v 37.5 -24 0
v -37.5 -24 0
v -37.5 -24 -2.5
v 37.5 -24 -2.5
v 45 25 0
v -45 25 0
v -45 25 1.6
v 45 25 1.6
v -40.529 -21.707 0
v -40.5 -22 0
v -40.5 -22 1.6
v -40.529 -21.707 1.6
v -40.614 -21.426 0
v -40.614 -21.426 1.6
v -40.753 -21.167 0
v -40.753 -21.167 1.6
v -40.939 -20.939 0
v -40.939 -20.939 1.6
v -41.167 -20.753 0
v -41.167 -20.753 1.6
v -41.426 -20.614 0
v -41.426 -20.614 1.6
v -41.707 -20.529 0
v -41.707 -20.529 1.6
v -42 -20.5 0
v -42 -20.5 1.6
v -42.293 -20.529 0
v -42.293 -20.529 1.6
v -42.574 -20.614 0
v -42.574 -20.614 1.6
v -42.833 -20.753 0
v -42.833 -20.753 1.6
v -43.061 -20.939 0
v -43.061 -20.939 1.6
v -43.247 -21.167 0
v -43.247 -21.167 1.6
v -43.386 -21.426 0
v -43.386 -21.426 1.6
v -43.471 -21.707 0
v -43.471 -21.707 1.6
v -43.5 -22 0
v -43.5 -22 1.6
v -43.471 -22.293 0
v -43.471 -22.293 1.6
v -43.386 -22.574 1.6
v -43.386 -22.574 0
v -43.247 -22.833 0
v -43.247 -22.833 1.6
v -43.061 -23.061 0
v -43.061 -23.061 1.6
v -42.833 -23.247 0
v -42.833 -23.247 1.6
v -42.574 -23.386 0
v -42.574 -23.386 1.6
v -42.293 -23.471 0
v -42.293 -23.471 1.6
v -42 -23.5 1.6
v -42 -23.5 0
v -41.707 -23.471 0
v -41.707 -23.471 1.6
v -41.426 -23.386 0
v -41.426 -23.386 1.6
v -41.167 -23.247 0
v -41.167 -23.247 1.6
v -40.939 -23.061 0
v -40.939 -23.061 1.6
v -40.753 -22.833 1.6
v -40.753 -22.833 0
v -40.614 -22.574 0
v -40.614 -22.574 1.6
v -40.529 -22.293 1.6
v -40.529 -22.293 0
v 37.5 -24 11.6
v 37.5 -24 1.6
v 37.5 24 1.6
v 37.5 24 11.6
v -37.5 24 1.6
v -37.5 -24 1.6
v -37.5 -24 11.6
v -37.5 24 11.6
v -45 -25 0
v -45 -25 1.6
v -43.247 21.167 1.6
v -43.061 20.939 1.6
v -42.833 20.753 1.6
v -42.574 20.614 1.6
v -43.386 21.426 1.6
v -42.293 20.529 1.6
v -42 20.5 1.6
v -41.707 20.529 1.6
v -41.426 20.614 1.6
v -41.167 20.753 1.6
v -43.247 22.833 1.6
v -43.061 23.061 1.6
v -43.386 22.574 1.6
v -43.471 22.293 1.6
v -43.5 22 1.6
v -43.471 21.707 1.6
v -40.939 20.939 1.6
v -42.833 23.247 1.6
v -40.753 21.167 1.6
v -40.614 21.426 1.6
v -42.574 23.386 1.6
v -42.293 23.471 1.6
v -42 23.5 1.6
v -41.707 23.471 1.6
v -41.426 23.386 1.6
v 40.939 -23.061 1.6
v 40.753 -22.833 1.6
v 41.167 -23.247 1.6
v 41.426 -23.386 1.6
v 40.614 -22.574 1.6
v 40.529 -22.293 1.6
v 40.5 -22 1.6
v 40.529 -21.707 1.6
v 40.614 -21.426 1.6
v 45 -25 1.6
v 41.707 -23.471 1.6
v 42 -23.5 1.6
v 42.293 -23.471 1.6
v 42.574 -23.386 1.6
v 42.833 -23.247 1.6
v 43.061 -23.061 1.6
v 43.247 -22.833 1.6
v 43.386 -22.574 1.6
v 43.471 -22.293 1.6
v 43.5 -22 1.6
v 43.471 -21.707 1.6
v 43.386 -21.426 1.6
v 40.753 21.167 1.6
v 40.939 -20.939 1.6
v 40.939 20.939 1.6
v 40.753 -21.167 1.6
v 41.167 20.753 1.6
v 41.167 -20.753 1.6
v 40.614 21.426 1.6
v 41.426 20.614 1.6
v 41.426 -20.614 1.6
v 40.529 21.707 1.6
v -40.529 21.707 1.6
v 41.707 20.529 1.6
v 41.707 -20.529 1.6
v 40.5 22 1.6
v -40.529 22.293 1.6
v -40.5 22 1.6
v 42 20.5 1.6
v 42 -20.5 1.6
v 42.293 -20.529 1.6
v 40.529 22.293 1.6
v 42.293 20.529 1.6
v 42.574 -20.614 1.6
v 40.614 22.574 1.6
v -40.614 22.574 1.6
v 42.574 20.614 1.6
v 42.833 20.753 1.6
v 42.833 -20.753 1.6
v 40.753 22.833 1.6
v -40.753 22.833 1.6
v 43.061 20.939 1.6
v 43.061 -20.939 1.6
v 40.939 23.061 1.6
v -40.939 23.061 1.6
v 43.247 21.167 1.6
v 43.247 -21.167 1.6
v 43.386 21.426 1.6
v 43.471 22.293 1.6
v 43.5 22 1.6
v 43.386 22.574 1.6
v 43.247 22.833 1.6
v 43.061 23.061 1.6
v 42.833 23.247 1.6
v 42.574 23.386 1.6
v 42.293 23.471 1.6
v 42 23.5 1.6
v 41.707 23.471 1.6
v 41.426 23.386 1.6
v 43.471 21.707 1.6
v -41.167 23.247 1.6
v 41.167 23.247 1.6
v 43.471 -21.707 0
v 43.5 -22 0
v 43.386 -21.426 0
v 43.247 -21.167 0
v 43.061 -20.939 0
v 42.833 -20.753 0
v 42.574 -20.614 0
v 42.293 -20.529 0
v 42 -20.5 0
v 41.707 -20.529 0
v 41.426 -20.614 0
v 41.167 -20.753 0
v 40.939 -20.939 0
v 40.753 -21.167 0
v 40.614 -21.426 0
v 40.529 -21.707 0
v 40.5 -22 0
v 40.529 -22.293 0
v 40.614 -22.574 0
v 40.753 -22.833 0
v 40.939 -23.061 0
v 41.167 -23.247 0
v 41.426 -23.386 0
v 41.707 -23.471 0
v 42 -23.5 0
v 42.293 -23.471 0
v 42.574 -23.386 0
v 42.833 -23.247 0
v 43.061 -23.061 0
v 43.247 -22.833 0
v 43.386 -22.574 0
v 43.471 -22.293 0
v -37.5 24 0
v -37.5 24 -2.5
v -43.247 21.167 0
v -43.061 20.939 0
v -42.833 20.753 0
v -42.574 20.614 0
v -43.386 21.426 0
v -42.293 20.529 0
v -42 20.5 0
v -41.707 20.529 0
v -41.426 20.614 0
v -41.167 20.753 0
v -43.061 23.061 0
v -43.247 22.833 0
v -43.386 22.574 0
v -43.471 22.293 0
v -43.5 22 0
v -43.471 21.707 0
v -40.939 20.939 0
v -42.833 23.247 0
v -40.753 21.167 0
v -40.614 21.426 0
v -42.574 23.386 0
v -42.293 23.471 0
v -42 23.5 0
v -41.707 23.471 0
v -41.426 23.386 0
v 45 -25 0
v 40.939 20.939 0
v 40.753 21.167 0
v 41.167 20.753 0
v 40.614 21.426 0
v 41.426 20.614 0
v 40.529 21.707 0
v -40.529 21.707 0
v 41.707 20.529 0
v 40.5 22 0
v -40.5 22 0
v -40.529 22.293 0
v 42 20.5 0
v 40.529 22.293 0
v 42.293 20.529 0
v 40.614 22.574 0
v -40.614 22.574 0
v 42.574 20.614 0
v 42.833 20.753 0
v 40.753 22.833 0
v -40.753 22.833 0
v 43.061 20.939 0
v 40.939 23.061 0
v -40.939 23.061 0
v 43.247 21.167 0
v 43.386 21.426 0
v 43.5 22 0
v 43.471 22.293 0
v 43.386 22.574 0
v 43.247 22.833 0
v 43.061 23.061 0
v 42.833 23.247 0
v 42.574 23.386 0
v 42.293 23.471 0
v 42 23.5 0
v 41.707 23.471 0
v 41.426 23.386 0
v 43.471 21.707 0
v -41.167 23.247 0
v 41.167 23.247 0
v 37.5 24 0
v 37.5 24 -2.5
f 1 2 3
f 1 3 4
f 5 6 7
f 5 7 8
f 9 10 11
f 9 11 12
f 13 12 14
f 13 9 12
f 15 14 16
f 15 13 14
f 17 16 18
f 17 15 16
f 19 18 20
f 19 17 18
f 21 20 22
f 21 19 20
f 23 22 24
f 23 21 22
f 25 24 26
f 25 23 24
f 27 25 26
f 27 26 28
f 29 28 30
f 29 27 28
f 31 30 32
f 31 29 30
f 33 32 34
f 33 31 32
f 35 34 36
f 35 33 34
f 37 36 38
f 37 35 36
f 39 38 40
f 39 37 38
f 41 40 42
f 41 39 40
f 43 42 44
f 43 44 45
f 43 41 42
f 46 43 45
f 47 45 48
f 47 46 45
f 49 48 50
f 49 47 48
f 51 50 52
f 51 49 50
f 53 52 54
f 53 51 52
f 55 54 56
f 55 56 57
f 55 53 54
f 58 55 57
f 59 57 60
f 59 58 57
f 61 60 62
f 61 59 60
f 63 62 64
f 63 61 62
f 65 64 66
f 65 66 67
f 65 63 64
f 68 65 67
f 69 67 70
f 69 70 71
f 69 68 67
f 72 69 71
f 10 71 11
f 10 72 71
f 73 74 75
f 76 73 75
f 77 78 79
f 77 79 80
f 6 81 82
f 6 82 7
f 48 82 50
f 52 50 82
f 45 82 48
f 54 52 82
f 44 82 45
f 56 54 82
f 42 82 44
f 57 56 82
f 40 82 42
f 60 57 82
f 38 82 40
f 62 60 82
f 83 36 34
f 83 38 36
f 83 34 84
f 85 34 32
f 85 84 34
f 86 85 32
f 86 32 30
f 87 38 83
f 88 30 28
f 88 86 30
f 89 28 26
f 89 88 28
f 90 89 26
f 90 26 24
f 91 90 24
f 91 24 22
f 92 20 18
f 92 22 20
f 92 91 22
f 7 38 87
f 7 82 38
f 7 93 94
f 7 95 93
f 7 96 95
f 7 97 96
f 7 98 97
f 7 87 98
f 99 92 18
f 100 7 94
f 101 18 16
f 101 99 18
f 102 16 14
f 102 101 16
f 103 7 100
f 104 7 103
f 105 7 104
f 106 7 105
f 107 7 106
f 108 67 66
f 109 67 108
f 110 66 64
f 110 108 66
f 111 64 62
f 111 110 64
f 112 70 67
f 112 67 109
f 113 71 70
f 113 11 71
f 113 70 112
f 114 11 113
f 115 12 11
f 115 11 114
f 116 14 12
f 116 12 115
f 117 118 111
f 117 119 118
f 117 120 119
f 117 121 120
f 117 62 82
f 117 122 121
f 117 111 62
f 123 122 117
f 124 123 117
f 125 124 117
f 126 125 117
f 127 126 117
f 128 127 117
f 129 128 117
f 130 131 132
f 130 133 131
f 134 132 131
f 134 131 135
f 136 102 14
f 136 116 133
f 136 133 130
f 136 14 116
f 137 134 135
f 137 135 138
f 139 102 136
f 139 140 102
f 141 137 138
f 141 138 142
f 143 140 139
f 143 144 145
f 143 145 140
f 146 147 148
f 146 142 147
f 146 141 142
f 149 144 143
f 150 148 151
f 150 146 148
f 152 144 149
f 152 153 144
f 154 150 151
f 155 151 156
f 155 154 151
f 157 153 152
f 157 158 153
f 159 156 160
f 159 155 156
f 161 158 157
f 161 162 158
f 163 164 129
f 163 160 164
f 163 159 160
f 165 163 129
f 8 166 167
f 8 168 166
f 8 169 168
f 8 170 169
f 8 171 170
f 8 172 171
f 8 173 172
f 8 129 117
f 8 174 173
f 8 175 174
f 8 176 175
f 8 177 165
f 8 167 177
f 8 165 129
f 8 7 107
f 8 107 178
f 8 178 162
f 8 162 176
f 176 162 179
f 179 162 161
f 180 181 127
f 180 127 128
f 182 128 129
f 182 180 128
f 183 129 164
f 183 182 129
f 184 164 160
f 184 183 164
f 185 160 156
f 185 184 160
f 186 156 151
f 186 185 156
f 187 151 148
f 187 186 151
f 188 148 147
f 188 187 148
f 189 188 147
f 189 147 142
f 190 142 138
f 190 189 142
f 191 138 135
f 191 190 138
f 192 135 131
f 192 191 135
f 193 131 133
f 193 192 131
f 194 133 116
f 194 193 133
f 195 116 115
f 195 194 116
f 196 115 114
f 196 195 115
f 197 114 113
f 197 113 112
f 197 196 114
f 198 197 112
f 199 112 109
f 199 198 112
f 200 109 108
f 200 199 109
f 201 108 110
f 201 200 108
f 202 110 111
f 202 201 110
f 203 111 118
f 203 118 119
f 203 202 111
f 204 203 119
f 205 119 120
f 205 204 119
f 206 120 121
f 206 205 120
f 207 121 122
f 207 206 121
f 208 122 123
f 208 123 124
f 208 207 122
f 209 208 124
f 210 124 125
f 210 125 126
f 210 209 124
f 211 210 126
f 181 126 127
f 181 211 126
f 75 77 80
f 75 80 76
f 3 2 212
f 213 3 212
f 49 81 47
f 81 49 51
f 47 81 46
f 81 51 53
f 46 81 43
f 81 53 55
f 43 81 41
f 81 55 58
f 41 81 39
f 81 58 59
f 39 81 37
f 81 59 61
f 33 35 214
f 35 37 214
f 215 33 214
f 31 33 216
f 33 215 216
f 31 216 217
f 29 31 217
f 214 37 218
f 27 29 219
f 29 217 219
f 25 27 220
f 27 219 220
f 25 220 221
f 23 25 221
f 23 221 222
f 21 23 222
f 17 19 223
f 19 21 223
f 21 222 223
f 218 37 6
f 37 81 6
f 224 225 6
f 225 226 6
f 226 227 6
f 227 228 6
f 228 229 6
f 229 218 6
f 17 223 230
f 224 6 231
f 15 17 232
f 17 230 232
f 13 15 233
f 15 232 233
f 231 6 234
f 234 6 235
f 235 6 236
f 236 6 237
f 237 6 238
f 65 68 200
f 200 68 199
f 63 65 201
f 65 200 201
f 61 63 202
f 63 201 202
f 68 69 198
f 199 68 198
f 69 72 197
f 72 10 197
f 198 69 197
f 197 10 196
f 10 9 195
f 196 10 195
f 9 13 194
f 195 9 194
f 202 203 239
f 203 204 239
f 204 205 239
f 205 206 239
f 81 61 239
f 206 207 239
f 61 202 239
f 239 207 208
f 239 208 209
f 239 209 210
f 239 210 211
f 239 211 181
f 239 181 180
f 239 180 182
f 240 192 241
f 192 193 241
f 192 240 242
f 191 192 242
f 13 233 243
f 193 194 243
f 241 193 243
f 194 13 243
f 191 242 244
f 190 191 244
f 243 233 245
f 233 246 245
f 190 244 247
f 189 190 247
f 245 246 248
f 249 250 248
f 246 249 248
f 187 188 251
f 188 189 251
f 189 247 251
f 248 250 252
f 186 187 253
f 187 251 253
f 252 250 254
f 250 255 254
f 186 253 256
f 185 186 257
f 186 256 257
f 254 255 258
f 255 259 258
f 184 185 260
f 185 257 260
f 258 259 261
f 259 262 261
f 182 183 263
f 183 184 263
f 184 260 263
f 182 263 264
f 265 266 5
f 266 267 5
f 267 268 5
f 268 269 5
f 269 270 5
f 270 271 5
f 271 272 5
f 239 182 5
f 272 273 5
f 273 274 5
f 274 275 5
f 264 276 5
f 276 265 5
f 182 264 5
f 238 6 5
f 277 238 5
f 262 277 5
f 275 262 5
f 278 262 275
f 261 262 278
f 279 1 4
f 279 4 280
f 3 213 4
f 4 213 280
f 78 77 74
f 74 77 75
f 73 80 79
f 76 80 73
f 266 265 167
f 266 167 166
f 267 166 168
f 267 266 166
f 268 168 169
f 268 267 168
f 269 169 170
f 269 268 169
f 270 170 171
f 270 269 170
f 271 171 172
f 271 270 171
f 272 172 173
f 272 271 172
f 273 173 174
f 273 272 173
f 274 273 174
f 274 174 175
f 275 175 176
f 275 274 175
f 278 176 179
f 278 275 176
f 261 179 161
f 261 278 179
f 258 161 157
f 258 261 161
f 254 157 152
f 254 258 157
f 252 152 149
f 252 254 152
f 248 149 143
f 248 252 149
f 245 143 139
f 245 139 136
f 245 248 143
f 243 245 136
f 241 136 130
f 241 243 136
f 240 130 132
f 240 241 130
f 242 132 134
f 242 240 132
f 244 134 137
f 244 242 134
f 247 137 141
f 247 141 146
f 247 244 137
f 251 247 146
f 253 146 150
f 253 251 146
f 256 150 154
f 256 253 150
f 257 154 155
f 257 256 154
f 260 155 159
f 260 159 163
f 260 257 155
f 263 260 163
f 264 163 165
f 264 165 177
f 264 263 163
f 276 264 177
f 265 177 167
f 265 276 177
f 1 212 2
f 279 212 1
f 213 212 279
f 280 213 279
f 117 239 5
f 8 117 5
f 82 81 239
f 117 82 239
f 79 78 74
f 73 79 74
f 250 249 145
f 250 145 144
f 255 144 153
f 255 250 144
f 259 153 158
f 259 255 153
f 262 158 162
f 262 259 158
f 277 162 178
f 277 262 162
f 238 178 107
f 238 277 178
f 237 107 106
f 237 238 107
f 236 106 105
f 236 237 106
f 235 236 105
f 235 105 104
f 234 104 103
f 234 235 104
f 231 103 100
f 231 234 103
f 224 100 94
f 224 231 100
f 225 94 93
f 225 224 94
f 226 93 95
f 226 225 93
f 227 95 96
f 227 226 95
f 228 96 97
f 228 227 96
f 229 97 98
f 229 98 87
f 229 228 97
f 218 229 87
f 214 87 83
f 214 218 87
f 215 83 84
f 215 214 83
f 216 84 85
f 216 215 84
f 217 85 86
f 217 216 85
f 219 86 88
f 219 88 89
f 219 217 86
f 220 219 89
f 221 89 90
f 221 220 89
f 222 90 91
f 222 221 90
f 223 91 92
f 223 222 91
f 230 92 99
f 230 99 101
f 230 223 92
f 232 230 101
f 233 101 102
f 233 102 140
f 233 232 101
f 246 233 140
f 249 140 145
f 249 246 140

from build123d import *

# Parameters (mm, degrees)
F0_W     = 90
F0_H     = 50
F0_R     = 1.5
F0_W_2   = 75
F0_H_2   = 48
F1_DEPTH = 1.6
F3_W     = 75
F3_H     = 48
F4_DEPTH = 10
F5_DEPTH = 2.5


with BuildPart() as f1:
    # F0 (on Top) → F1 (new body)
    with BuildSketch(Plane.XY):
        Rectangle(F0_W, F0_H)
        with Locations((-42, -22)):
            Circle(F0_R, mode=Mode.SUBTRACT)
        with Locations((42, -22)):
            Circle(F0_R, mode=Mode.SUBTRACT)
        with Locations((-42, 22)):
            Circle(F0_R, mode=Mode.SUBTRACT)
        Rectangle(F0_W_2, F0_H_2, mode=Mode.SUBTRACT)
        with Locations((42, 22)):
            Circle(F0_R, mode=Mode.SUBTRACT)
        Rectangle(F0_W_2, F0_H_2)
    extrude(amount=F1_DEPTH)


with BuildPart() as f4:
    # F3 (on offset) → F4 (new body)
    with BuildSketch(Plane.XY.offset(1.6)):
        Rectangle(F3_W, F3_H)
    extrude(amount=F4_DEPTH)


with BuildPart() as f5:
    # F0 (on Top) → F5 (new body)
    with BuildSketch(Plane.XY):
        Rectangle(F0_W_2, F0_H_2)
    extrude(amount=-F5_DEPTH)


solid = Compound([f1.part, f4.part, f5.part])
